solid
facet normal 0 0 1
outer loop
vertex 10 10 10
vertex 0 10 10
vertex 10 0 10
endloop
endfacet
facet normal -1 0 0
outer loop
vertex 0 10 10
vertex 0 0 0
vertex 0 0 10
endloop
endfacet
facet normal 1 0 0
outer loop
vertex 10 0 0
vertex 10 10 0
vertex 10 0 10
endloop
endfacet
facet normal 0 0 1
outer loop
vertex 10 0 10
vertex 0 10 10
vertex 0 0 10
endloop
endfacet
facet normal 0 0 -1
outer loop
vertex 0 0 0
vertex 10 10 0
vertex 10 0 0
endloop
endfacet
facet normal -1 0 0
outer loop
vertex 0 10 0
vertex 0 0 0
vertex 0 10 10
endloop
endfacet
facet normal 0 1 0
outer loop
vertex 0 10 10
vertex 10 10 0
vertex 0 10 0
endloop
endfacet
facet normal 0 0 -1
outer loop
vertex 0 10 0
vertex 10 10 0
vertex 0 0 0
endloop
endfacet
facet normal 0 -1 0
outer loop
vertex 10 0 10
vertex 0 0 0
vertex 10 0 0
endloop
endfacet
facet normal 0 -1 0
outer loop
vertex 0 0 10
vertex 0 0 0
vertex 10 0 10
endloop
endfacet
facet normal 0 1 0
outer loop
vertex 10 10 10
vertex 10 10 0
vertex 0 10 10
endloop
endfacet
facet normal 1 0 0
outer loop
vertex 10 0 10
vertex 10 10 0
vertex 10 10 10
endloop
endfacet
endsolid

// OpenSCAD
// Failure class 5: hull() misuse
// hull() requires at least two children to compute the convex hull.
// With only one child, the result is just that child (no hull computed),
// which is likely not the intended behavior.
hull() {
  cube([10, 10, 10]);
}
